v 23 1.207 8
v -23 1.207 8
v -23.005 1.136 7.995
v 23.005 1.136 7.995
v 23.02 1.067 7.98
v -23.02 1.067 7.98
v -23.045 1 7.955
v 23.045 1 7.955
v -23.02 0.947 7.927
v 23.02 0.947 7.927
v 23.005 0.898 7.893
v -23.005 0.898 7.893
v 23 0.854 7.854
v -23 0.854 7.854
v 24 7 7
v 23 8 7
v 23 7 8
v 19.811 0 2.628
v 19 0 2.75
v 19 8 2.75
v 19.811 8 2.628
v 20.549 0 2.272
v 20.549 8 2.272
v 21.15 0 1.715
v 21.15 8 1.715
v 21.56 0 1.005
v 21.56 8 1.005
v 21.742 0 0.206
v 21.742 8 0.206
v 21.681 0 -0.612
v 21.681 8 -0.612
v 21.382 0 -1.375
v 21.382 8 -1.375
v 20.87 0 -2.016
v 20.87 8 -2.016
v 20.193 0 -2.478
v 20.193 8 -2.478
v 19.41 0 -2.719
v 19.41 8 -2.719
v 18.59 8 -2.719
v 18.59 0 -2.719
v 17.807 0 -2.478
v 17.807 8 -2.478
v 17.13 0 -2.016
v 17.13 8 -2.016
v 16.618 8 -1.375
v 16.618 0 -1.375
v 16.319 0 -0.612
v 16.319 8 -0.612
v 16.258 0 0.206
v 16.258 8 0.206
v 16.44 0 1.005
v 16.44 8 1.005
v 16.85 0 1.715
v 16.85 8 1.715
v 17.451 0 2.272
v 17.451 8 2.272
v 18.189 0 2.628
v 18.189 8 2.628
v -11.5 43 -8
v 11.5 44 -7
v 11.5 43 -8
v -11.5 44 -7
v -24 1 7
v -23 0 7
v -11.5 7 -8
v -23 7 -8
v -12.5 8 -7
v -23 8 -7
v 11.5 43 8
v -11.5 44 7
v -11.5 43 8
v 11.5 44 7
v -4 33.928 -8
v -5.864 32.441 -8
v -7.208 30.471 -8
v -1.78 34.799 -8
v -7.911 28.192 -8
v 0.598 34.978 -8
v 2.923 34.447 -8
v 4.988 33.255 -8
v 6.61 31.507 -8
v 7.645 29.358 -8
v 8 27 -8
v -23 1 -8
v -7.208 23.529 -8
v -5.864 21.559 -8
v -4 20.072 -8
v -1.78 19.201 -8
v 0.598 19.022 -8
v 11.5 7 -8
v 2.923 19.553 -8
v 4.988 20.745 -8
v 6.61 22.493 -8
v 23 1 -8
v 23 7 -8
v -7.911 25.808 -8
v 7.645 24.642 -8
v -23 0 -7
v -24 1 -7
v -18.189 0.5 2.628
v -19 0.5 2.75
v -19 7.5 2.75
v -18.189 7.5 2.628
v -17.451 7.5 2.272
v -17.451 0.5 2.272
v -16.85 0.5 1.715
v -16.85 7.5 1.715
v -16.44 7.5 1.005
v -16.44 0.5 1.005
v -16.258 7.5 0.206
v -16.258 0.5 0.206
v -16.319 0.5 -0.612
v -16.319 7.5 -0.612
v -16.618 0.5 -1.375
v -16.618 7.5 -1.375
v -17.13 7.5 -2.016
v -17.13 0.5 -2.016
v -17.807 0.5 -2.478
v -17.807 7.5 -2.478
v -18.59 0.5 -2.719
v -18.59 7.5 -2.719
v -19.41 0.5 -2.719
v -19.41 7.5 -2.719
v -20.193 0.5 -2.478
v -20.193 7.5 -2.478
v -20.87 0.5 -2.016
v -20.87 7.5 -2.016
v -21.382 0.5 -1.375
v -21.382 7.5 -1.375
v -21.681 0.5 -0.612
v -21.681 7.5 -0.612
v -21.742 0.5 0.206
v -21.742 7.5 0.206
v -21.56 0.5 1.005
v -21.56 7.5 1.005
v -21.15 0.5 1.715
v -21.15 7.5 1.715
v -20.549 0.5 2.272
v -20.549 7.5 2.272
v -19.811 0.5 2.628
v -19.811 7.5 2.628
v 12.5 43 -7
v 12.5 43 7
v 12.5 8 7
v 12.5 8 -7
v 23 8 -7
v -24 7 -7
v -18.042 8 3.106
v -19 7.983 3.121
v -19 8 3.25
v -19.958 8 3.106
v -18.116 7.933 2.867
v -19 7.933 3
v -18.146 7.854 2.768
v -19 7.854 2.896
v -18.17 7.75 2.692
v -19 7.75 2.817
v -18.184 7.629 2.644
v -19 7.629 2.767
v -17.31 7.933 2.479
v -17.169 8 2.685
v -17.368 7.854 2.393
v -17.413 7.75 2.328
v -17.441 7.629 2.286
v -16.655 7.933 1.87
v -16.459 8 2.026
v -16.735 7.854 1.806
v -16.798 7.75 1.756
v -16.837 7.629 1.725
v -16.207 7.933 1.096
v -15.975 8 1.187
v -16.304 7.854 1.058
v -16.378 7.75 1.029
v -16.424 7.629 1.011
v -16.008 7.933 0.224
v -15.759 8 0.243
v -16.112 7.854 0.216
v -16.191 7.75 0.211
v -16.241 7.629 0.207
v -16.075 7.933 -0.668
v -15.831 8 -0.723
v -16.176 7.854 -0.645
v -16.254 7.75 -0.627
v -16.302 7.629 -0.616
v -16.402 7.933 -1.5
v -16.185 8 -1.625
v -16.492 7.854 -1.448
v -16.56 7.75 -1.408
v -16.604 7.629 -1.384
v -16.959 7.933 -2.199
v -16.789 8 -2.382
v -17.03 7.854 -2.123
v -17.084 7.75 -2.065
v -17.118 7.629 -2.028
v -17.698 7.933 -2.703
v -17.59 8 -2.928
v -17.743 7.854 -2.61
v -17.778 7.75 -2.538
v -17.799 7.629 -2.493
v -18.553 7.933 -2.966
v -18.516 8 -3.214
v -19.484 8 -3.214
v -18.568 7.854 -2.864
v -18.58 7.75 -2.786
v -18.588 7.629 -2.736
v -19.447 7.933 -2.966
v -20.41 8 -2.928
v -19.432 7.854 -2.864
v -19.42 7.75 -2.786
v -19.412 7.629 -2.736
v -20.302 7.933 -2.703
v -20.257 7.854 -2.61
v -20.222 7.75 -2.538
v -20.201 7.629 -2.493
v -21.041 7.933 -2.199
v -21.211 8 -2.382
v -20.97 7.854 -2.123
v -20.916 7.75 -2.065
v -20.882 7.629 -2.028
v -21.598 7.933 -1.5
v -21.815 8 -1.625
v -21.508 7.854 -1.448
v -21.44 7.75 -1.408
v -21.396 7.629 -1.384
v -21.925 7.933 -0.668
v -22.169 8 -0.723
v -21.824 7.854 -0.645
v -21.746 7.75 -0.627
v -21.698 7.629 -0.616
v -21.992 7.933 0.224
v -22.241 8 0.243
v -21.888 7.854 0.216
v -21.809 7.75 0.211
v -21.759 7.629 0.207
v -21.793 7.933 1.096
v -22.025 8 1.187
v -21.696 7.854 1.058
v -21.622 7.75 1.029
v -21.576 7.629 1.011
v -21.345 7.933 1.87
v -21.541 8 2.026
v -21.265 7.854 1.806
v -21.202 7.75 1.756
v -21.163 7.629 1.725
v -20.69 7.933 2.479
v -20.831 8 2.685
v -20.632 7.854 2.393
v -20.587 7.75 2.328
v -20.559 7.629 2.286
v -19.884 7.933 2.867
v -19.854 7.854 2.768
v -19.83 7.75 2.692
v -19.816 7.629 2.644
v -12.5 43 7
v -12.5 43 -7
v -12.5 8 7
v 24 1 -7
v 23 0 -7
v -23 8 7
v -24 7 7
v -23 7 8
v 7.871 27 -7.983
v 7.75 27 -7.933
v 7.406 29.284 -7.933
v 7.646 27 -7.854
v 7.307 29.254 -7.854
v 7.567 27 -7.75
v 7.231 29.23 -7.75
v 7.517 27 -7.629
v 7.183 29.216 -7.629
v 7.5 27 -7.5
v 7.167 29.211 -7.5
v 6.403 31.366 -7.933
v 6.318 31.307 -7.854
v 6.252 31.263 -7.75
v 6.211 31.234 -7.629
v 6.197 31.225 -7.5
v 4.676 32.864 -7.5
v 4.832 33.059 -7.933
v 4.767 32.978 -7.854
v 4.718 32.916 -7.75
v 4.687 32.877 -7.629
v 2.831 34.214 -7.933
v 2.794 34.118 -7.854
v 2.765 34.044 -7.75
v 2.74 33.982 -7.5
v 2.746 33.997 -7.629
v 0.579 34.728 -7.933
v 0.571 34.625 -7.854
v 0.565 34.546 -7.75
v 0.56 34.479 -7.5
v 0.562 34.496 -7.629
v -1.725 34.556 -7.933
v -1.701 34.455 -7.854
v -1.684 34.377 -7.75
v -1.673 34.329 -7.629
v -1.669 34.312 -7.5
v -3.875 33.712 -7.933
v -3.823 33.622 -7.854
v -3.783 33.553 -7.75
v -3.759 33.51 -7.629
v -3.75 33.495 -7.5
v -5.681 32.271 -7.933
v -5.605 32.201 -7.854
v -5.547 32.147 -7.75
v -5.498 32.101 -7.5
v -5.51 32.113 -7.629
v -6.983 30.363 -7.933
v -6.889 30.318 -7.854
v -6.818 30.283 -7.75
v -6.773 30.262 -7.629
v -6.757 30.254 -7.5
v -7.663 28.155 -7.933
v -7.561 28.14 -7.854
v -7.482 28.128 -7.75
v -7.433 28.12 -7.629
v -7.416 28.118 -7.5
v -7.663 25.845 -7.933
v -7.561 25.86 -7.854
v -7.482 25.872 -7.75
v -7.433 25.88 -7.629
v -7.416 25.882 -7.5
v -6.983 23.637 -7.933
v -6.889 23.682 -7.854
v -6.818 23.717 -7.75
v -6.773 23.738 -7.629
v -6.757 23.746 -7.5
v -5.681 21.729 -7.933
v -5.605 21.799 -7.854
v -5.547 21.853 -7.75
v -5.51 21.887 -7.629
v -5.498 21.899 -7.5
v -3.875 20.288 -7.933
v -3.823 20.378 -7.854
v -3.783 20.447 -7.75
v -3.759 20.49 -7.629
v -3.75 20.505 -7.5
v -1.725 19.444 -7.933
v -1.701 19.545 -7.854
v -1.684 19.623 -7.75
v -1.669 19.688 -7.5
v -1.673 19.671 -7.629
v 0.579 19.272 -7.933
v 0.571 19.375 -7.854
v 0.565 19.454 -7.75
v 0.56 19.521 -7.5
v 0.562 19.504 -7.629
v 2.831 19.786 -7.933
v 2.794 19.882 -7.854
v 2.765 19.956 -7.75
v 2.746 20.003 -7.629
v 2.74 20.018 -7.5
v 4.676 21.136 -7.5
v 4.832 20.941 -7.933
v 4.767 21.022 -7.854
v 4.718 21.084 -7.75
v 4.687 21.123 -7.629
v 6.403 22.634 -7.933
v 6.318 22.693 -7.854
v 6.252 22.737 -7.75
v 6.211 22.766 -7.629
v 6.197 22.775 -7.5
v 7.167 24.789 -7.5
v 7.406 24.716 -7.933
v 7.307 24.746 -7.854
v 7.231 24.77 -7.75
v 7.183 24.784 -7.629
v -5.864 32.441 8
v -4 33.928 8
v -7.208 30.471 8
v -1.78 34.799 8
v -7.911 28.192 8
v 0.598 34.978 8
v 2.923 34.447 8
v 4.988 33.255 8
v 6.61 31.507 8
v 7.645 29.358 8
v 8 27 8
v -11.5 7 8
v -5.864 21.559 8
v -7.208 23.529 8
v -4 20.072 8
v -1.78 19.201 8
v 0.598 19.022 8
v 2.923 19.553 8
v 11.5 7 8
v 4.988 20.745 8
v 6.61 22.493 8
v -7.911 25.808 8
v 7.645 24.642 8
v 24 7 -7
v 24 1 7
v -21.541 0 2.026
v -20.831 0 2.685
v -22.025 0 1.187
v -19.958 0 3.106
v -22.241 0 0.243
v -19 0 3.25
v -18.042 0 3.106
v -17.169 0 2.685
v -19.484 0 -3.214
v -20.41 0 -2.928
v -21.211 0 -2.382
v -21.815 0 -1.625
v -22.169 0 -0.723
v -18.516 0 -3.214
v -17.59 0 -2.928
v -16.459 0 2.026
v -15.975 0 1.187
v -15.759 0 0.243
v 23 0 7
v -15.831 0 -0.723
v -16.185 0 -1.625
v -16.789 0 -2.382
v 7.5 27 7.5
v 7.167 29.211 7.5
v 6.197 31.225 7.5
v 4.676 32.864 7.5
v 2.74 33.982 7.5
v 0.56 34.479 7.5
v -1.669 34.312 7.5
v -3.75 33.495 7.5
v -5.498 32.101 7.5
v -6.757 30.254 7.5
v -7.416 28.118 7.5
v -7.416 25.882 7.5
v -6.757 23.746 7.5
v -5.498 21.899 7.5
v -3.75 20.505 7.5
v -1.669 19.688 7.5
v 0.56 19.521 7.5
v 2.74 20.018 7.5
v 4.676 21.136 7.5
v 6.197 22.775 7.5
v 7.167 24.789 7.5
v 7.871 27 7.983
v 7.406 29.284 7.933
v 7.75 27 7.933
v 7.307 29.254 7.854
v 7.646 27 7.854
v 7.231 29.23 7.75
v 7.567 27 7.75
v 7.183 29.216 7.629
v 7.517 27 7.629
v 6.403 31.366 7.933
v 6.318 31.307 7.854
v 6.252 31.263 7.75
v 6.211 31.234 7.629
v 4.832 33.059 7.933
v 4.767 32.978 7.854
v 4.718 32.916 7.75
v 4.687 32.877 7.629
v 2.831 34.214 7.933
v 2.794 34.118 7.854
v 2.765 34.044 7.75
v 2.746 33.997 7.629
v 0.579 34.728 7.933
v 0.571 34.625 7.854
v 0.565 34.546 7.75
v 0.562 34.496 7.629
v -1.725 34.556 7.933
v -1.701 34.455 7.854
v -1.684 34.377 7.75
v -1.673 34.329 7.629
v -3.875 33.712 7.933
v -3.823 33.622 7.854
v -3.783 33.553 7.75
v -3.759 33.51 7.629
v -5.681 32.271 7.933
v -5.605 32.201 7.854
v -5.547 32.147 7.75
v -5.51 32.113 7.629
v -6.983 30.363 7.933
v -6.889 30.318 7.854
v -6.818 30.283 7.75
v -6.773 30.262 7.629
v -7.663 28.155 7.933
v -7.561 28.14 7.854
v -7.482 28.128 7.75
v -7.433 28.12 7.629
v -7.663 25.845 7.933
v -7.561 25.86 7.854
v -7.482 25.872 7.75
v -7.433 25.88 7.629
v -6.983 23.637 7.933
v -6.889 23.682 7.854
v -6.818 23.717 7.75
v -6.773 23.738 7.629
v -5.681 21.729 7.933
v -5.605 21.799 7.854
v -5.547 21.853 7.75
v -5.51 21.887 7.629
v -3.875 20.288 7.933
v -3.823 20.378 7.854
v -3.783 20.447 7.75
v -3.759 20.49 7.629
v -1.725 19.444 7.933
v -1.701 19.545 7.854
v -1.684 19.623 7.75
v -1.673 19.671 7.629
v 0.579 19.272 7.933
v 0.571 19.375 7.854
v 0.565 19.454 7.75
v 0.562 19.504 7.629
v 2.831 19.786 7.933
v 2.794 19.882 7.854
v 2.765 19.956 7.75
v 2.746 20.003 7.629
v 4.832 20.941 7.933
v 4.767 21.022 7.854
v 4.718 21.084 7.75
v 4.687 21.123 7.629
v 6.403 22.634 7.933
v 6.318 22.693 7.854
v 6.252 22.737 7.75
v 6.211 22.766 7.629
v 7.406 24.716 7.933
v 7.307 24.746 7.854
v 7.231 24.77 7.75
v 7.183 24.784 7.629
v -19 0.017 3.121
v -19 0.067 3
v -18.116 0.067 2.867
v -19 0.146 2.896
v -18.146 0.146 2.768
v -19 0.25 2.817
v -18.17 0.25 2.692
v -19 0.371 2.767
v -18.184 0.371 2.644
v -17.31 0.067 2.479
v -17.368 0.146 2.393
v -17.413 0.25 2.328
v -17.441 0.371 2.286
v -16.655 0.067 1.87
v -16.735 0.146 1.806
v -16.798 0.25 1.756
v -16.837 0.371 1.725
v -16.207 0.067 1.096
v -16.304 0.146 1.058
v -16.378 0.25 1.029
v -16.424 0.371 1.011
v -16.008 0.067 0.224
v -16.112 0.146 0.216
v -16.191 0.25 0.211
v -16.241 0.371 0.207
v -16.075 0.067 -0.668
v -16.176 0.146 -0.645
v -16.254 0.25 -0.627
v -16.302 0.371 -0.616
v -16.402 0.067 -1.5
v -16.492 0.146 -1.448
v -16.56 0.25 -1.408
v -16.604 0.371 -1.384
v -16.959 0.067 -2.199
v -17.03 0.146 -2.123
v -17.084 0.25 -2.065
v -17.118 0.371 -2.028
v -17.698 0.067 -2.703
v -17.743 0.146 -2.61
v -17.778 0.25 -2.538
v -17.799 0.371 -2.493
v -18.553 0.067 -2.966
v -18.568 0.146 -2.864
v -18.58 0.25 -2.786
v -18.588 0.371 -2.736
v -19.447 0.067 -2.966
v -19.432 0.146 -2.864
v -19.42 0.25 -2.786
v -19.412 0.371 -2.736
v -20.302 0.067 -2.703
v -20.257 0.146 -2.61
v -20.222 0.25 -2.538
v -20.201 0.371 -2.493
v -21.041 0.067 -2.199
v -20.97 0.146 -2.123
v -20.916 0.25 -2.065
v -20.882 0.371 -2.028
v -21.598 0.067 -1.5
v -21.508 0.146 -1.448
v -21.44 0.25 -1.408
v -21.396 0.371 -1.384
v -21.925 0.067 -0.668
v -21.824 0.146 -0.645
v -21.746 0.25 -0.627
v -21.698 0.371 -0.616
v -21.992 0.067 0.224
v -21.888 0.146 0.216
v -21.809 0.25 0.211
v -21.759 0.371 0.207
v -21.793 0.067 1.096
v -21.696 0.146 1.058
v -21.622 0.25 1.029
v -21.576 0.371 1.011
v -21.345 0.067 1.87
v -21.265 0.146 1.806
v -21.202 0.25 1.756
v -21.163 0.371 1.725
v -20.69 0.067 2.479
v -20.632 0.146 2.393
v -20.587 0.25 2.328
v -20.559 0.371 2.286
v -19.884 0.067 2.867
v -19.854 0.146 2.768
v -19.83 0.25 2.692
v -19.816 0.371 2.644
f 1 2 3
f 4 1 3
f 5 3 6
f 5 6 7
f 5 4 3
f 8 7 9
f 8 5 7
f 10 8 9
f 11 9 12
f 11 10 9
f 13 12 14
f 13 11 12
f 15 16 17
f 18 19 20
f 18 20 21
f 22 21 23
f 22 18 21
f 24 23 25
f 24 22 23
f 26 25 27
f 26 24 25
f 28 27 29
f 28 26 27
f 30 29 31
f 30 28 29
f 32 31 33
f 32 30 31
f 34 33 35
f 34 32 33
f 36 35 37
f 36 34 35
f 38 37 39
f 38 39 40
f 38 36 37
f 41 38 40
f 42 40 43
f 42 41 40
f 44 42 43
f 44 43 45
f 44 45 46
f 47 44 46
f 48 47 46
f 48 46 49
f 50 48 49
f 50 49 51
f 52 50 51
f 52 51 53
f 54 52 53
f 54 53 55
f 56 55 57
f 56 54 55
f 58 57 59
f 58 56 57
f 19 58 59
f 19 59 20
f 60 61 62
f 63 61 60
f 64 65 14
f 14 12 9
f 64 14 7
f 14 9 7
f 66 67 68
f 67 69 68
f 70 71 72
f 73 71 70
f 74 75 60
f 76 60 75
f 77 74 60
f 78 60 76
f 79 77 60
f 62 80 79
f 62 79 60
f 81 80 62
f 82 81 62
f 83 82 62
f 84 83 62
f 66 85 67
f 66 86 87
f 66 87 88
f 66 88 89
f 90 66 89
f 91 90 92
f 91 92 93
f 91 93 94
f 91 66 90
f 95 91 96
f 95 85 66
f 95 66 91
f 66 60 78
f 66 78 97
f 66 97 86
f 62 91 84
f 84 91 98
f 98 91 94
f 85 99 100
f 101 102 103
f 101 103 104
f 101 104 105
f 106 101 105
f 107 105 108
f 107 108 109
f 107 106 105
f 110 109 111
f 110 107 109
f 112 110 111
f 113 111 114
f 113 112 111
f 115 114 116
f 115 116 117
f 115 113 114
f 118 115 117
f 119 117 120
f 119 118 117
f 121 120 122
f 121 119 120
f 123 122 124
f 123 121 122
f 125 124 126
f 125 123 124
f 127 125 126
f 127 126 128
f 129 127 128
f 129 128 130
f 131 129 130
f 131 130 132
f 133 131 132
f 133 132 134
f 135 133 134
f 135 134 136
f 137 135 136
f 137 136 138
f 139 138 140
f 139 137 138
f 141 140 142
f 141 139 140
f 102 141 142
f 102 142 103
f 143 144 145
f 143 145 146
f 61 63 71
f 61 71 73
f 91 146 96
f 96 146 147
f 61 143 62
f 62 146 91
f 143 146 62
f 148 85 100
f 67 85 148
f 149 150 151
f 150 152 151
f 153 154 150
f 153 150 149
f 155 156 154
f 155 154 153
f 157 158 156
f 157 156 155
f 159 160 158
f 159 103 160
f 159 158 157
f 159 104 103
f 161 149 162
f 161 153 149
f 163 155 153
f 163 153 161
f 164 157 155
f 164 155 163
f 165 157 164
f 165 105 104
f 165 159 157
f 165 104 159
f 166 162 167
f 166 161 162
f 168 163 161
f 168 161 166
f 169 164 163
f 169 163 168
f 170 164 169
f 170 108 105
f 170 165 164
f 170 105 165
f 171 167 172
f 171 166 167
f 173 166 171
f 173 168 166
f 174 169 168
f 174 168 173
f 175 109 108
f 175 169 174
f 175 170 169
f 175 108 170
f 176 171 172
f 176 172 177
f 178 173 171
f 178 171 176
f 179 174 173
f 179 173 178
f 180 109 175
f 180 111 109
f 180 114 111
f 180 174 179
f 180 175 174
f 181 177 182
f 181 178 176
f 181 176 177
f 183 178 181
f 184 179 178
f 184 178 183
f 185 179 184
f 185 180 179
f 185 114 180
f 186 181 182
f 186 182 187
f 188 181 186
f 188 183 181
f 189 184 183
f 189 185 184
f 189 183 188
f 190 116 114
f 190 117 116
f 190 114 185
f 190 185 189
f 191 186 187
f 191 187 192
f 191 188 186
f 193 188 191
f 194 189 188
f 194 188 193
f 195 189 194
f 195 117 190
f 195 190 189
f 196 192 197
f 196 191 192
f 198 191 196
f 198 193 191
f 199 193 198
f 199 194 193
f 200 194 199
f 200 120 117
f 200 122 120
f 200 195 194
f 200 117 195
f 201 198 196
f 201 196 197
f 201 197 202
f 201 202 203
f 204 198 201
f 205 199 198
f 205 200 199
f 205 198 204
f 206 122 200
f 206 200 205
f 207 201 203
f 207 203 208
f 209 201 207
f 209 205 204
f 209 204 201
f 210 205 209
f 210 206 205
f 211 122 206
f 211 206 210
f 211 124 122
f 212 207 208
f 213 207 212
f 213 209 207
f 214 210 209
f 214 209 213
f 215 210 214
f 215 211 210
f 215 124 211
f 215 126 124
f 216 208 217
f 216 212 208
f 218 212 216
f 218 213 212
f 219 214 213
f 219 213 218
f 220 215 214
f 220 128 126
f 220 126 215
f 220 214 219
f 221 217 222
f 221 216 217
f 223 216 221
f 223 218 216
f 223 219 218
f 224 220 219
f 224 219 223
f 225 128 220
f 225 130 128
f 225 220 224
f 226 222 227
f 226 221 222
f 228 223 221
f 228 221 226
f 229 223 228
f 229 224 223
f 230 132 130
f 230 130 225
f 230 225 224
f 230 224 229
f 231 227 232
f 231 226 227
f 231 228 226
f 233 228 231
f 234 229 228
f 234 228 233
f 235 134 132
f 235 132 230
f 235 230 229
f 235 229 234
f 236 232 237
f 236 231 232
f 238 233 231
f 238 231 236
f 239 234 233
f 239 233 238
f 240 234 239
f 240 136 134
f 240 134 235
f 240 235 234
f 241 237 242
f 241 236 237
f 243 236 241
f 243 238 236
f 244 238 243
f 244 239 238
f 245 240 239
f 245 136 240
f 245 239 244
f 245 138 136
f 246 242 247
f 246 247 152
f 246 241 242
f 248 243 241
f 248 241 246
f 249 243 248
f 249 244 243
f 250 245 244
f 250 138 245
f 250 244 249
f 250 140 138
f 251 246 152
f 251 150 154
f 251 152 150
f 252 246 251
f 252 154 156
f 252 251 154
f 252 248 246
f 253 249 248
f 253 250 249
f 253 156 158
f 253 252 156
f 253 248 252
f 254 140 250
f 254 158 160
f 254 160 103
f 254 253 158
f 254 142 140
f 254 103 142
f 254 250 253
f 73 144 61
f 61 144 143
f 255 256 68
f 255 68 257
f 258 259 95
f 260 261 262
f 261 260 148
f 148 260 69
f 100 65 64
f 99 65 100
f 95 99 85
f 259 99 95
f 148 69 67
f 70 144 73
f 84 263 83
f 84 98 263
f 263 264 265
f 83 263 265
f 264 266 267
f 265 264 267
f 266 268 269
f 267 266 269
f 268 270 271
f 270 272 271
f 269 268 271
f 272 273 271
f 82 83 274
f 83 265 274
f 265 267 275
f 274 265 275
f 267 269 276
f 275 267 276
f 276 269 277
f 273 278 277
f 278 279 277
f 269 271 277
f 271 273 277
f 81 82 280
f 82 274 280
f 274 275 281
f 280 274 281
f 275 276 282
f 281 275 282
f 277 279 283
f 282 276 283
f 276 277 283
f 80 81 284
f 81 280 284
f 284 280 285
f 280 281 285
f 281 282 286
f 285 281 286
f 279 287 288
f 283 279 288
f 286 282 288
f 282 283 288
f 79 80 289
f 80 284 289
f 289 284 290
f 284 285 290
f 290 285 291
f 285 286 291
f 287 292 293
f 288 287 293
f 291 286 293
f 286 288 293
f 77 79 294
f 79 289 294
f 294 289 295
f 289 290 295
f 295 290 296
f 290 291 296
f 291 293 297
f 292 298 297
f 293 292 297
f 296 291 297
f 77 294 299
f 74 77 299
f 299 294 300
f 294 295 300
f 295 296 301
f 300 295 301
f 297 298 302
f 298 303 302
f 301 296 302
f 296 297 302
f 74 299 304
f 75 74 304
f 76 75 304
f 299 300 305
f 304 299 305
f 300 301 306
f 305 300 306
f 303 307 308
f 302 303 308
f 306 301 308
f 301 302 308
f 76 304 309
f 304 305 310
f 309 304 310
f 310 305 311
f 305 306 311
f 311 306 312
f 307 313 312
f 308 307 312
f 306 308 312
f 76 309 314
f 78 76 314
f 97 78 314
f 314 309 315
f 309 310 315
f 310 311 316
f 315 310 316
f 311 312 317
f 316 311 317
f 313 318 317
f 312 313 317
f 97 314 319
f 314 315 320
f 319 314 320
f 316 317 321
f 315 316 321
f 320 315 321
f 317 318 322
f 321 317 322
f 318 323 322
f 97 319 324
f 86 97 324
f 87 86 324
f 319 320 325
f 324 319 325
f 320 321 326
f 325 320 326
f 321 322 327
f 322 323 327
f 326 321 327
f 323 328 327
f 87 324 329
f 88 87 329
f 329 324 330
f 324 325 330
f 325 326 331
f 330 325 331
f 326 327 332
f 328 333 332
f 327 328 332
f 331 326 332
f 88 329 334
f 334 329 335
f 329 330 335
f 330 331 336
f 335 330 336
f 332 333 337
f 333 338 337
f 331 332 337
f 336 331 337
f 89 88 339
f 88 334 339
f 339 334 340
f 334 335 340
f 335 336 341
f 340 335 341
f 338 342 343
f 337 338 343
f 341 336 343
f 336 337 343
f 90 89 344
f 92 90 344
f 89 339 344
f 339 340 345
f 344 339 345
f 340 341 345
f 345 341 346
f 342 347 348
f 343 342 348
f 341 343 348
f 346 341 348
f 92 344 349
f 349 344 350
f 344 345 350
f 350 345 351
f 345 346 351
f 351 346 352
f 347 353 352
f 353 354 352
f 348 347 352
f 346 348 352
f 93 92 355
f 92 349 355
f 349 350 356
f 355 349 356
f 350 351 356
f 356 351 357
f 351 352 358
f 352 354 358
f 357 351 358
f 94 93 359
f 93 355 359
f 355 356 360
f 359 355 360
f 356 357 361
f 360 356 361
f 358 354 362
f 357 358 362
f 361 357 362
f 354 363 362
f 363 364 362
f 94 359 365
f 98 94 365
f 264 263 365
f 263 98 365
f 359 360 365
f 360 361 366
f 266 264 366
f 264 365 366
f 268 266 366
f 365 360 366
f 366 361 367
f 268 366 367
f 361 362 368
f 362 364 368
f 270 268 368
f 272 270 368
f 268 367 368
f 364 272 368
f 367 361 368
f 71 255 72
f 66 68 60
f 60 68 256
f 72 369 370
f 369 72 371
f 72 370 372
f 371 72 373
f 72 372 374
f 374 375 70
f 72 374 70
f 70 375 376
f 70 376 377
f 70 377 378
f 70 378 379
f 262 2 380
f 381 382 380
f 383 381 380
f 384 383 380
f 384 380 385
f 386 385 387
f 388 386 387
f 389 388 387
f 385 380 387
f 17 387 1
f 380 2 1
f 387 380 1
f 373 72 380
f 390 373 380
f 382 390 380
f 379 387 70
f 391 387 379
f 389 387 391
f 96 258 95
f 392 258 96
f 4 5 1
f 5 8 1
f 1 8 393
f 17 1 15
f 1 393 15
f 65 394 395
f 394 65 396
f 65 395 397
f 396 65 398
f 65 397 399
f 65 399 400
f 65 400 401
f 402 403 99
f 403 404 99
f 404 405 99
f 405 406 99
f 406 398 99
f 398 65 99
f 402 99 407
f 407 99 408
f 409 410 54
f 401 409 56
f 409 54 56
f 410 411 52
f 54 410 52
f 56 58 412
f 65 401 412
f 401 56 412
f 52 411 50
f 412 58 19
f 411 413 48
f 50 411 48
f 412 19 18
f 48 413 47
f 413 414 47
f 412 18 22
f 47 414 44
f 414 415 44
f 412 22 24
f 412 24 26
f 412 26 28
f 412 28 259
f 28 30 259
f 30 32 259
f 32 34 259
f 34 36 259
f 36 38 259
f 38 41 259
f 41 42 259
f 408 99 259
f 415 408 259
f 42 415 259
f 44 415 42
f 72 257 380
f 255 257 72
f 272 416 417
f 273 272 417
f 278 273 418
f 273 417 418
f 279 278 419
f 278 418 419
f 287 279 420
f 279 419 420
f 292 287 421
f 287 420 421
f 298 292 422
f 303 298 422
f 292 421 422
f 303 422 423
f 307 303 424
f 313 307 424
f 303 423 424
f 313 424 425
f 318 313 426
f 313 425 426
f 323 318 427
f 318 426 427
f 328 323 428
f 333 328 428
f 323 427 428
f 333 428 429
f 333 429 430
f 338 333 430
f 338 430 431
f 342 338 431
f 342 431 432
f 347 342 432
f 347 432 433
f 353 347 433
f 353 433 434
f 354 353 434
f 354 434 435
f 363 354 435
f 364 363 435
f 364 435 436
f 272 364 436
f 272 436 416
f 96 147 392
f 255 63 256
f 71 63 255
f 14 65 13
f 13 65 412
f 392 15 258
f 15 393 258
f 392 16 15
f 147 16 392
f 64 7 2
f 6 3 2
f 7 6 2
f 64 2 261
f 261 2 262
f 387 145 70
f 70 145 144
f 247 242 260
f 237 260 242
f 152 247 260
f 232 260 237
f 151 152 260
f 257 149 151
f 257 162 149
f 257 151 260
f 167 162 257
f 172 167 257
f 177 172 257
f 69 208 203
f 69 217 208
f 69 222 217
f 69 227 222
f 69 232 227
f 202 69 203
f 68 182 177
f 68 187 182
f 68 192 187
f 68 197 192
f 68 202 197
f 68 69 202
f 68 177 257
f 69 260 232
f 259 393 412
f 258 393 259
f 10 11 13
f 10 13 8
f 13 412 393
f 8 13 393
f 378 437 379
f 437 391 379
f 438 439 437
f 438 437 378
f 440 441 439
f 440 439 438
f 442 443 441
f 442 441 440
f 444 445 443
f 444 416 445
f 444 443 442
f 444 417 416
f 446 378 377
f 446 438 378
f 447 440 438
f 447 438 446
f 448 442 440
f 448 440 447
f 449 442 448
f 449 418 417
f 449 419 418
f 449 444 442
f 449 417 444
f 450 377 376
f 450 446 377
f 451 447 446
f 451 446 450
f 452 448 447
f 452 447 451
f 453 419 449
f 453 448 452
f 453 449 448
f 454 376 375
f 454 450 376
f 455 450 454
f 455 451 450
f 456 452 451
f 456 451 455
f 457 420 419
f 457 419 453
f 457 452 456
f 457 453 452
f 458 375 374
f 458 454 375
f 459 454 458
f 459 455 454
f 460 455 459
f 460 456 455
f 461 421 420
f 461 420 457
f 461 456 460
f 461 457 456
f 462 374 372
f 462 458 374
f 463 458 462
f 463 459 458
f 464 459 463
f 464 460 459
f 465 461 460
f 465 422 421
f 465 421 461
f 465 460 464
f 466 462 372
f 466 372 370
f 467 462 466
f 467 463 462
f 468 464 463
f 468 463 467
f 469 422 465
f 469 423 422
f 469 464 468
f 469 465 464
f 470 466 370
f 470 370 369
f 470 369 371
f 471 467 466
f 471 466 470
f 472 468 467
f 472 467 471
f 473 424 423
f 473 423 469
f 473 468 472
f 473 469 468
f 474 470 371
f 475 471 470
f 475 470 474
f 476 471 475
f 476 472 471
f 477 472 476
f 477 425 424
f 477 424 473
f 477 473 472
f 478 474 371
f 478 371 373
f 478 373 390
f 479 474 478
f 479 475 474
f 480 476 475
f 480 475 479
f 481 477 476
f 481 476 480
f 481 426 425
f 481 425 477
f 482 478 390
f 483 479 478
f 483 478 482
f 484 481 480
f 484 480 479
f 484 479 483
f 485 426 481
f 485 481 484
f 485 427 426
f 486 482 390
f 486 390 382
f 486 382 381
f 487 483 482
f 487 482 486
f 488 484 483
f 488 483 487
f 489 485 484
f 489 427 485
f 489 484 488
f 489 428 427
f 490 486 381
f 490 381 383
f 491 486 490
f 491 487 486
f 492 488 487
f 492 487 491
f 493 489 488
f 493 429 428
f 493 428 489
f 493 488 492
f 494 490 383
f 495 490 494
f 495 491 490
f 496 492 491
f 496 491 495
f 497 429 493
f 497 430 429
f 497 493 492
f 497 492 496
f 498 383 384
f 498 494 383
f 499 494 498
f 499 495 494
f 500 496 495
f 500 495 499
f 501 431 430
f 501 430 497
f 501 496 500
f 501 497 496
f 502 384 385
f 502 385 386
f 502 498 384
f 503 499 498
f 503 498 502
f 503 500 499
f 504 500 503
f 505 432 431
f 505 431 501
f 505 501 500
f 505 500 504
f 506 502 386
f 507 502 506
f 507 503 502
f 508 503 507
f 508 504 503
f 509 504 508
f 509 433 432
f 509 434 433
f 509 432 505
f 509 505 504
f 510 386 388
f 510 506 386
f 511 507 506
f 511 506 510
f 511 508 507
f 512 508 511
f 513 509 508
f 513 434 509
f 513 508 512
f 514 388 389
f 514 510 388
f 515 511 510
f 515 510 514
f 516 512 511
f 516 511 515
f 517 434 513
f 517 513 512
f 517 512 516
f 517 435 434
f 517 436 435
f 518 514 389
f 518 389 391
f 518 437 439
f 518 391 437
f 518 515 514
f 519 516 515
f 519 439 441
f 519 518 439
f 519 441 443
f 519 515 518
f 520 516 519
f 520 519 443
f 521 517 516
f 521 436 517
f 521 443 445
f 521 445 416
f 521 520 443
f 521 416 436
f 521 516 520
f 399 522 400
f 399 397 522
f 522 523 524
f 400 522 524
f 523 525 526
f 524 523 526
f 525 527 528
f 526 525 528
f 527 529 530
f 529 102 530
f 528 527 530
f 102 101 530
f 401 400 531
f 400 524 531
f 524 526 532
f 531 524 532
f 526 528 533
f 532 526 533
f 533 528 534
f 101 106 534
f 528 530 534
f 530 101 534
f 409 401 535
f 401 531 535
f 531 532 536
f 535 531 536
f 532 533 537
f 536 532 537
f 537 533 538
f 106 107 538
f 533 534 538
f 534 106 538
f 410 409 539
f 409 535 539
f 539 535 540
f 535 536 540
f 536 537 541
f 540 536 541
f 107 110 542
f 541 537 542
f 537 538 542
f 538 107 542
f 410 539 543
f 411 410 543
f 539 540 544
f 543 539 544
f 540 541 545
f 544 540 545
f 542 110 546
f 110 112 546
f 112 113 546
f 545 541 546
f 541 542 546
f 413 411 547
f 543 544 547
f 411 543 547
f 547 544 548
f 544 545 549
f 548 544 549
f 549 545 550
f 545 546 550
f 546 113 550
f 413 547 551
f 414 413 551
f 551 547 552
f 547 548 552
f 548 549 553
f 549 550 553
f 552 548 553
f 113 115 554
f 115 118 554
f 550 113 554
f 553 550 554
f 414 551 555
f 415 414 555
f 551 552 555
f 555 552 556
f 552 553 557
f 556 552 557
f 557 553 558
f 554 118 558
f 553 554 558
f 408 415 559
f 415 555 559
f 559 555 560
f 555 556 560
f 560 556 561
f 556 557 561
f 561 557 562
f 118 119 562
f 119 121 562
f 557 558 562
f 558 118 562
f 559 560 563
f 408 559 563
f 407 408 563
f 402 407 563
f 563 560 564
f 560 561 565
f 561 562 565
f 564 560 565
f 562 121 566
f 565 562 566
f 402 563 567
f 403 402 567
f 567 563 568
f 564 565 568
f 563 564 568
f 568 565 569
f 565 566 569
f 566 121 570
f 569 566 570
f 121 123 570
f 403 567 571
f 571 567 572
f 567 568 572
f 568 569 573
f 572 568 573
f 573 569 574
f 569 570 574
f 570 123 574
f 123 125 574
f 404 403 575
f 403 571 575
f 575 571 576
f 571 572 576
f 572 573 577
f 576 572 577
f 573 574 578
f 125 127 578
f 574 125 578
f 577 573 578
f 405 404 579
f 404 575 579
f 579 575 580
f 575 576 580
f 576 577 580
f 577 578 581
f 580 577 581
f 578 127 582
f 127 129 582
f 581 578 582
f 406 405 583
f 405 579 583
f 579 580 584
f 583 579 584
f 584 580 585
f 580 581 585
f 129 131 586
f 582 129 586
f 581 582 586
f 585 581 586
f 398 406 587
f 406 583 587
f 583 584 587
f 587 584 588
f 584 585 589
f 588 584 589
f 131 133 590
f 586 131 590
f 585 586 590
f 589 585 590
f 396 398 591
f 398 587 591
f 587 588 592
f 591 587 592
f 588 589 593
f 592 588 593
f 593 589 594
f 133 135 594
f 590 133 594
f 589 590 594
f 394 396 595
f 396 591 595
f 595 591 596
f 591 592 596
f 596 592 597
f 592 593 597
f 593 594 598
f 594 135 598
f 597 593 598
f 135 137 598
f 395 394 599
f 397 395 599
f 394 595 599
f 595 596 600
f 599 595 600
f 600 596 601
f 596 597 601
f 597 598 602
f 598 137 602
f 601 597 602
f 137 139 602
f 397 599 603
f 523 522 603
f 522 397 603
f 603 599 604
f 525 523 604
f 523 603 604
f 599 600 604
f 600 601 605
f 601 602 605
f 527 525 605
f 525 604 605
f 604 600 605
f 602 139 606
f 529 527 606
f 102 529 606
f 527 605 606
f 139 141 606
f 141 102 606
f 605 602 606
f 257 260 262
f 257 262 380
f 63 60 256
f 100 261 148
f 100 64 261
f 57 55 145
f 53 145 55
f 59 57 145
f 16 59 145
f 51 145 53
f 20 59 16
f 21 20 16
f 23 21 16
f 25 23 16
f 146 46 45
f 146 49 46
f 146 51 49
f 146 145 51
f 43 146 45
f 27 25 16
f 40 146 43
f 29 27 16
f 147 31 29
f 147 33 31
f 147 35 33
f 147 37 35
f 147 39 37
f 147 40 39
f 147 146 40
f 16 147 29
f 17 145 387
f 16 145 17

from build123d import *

# Parameters (mm, degrees)
SKETCH_1_W          = 48
SKETCH_1_H          = 16
SKETCH_1_R          = 2.75
EXTRUDE_1_DEPTH     = 8
EXTRUDE_2_DEPTH     = 36
SKETCH_3_R          = 7.5
CUT_EXTRUDE_1_DEPTH = 36
CHAMFER_1_SIZE      = 1
FILLET_1_R          = 0.5


with BuildPart() as part:
    # 草图1 → 凸台-拉伸1 (new body)
    with BuildSketch(Plane(origin=(0, 0, 0), x_dir=(1, 0, 0), z_dir=(0, 1, 0))):
        Rectangle(SKETCH_1_W, SKETCH_1_H)
        with Locations(Location((19, 0, 0), (0, 0, 270))):
            Circle(SKETCH_1_R, mode=Mode.SUBTRACT)
        with Locations(Location((-19, 0, 0), (0, 0, 270))):
            Circle(SKETCH_1_R, mode=Mode.SUBTRACT)
    extrude(amount=EXTRUDE_1_DEPTH)

    # 草图2 → 凸台-拉伸2 (add)
    with BuildSketch(Plane(origin=(0, 8, 0), x_dir=(1, 0, 0), z_dir=(0, 1, 0))):
        Polygon((12.5, -8), (12.5, 8), (-12.5, 8), align=None)
        Polygon((-12.5, -8), (12.5, -8), (-12.5, 8), align=None)
    extrude(amount=EXTRUDE_2_DEPTH)

    # 草图3 → 切除-拉伸1 (cut)
    with BuildSketch(Plane.XY.offset(8)):
        with Locations((0, 27)):
            Circle(SKETCH_3_R)
    extrude(amount=-CUT_EXTRUDE_1_DEPTH, mode=Mode.SUBTRACT)

    # 倒角1
    chamfer_1_edges = [part.edges().sort_by_distance(p)[0] for p in [
        (24, 8, 0),
        (18.25, 8, -8),
        (18.25, 8, 8),
        (-18.25, 8, -8),
        (12.5, 26, -8),
        (-12.5, 26, -8),
        (-12.5, 26, 8),
        (12.5, 44, 0),
        (12.5, 26, 8),
        (0, 44, -8),
        (-12.5, 44, 0),
        (0, 44, 8),
        (-24, 8, 0),
        (0, 0, -8),
        (24, 0, 0),
        (0, 0, 8),
        (-24, 0, 0),
        (-24, 4, -8),
        (24, 4, -8),
        (24, 4, 8),
        (-24, 4, 8),
        (-18.25, 8, 8),
    ]]
    chamfer(chamfer_1_edges, length=CHAMFER_1_SIZE)

    # 圆角1
    fillet_1_edges = [part.edges().sort_by_distance(p)[0] for p in [
        (-19, 0, -2.75),
        (-19, 8, -2.75),
        (-7.5, 27, -8),
        (-7.5, 27, 8),
        (0, 1, 8),
    ]]
    fillet(fillet_1_edges, radius=FILLET_1_R)


solid = part.part
